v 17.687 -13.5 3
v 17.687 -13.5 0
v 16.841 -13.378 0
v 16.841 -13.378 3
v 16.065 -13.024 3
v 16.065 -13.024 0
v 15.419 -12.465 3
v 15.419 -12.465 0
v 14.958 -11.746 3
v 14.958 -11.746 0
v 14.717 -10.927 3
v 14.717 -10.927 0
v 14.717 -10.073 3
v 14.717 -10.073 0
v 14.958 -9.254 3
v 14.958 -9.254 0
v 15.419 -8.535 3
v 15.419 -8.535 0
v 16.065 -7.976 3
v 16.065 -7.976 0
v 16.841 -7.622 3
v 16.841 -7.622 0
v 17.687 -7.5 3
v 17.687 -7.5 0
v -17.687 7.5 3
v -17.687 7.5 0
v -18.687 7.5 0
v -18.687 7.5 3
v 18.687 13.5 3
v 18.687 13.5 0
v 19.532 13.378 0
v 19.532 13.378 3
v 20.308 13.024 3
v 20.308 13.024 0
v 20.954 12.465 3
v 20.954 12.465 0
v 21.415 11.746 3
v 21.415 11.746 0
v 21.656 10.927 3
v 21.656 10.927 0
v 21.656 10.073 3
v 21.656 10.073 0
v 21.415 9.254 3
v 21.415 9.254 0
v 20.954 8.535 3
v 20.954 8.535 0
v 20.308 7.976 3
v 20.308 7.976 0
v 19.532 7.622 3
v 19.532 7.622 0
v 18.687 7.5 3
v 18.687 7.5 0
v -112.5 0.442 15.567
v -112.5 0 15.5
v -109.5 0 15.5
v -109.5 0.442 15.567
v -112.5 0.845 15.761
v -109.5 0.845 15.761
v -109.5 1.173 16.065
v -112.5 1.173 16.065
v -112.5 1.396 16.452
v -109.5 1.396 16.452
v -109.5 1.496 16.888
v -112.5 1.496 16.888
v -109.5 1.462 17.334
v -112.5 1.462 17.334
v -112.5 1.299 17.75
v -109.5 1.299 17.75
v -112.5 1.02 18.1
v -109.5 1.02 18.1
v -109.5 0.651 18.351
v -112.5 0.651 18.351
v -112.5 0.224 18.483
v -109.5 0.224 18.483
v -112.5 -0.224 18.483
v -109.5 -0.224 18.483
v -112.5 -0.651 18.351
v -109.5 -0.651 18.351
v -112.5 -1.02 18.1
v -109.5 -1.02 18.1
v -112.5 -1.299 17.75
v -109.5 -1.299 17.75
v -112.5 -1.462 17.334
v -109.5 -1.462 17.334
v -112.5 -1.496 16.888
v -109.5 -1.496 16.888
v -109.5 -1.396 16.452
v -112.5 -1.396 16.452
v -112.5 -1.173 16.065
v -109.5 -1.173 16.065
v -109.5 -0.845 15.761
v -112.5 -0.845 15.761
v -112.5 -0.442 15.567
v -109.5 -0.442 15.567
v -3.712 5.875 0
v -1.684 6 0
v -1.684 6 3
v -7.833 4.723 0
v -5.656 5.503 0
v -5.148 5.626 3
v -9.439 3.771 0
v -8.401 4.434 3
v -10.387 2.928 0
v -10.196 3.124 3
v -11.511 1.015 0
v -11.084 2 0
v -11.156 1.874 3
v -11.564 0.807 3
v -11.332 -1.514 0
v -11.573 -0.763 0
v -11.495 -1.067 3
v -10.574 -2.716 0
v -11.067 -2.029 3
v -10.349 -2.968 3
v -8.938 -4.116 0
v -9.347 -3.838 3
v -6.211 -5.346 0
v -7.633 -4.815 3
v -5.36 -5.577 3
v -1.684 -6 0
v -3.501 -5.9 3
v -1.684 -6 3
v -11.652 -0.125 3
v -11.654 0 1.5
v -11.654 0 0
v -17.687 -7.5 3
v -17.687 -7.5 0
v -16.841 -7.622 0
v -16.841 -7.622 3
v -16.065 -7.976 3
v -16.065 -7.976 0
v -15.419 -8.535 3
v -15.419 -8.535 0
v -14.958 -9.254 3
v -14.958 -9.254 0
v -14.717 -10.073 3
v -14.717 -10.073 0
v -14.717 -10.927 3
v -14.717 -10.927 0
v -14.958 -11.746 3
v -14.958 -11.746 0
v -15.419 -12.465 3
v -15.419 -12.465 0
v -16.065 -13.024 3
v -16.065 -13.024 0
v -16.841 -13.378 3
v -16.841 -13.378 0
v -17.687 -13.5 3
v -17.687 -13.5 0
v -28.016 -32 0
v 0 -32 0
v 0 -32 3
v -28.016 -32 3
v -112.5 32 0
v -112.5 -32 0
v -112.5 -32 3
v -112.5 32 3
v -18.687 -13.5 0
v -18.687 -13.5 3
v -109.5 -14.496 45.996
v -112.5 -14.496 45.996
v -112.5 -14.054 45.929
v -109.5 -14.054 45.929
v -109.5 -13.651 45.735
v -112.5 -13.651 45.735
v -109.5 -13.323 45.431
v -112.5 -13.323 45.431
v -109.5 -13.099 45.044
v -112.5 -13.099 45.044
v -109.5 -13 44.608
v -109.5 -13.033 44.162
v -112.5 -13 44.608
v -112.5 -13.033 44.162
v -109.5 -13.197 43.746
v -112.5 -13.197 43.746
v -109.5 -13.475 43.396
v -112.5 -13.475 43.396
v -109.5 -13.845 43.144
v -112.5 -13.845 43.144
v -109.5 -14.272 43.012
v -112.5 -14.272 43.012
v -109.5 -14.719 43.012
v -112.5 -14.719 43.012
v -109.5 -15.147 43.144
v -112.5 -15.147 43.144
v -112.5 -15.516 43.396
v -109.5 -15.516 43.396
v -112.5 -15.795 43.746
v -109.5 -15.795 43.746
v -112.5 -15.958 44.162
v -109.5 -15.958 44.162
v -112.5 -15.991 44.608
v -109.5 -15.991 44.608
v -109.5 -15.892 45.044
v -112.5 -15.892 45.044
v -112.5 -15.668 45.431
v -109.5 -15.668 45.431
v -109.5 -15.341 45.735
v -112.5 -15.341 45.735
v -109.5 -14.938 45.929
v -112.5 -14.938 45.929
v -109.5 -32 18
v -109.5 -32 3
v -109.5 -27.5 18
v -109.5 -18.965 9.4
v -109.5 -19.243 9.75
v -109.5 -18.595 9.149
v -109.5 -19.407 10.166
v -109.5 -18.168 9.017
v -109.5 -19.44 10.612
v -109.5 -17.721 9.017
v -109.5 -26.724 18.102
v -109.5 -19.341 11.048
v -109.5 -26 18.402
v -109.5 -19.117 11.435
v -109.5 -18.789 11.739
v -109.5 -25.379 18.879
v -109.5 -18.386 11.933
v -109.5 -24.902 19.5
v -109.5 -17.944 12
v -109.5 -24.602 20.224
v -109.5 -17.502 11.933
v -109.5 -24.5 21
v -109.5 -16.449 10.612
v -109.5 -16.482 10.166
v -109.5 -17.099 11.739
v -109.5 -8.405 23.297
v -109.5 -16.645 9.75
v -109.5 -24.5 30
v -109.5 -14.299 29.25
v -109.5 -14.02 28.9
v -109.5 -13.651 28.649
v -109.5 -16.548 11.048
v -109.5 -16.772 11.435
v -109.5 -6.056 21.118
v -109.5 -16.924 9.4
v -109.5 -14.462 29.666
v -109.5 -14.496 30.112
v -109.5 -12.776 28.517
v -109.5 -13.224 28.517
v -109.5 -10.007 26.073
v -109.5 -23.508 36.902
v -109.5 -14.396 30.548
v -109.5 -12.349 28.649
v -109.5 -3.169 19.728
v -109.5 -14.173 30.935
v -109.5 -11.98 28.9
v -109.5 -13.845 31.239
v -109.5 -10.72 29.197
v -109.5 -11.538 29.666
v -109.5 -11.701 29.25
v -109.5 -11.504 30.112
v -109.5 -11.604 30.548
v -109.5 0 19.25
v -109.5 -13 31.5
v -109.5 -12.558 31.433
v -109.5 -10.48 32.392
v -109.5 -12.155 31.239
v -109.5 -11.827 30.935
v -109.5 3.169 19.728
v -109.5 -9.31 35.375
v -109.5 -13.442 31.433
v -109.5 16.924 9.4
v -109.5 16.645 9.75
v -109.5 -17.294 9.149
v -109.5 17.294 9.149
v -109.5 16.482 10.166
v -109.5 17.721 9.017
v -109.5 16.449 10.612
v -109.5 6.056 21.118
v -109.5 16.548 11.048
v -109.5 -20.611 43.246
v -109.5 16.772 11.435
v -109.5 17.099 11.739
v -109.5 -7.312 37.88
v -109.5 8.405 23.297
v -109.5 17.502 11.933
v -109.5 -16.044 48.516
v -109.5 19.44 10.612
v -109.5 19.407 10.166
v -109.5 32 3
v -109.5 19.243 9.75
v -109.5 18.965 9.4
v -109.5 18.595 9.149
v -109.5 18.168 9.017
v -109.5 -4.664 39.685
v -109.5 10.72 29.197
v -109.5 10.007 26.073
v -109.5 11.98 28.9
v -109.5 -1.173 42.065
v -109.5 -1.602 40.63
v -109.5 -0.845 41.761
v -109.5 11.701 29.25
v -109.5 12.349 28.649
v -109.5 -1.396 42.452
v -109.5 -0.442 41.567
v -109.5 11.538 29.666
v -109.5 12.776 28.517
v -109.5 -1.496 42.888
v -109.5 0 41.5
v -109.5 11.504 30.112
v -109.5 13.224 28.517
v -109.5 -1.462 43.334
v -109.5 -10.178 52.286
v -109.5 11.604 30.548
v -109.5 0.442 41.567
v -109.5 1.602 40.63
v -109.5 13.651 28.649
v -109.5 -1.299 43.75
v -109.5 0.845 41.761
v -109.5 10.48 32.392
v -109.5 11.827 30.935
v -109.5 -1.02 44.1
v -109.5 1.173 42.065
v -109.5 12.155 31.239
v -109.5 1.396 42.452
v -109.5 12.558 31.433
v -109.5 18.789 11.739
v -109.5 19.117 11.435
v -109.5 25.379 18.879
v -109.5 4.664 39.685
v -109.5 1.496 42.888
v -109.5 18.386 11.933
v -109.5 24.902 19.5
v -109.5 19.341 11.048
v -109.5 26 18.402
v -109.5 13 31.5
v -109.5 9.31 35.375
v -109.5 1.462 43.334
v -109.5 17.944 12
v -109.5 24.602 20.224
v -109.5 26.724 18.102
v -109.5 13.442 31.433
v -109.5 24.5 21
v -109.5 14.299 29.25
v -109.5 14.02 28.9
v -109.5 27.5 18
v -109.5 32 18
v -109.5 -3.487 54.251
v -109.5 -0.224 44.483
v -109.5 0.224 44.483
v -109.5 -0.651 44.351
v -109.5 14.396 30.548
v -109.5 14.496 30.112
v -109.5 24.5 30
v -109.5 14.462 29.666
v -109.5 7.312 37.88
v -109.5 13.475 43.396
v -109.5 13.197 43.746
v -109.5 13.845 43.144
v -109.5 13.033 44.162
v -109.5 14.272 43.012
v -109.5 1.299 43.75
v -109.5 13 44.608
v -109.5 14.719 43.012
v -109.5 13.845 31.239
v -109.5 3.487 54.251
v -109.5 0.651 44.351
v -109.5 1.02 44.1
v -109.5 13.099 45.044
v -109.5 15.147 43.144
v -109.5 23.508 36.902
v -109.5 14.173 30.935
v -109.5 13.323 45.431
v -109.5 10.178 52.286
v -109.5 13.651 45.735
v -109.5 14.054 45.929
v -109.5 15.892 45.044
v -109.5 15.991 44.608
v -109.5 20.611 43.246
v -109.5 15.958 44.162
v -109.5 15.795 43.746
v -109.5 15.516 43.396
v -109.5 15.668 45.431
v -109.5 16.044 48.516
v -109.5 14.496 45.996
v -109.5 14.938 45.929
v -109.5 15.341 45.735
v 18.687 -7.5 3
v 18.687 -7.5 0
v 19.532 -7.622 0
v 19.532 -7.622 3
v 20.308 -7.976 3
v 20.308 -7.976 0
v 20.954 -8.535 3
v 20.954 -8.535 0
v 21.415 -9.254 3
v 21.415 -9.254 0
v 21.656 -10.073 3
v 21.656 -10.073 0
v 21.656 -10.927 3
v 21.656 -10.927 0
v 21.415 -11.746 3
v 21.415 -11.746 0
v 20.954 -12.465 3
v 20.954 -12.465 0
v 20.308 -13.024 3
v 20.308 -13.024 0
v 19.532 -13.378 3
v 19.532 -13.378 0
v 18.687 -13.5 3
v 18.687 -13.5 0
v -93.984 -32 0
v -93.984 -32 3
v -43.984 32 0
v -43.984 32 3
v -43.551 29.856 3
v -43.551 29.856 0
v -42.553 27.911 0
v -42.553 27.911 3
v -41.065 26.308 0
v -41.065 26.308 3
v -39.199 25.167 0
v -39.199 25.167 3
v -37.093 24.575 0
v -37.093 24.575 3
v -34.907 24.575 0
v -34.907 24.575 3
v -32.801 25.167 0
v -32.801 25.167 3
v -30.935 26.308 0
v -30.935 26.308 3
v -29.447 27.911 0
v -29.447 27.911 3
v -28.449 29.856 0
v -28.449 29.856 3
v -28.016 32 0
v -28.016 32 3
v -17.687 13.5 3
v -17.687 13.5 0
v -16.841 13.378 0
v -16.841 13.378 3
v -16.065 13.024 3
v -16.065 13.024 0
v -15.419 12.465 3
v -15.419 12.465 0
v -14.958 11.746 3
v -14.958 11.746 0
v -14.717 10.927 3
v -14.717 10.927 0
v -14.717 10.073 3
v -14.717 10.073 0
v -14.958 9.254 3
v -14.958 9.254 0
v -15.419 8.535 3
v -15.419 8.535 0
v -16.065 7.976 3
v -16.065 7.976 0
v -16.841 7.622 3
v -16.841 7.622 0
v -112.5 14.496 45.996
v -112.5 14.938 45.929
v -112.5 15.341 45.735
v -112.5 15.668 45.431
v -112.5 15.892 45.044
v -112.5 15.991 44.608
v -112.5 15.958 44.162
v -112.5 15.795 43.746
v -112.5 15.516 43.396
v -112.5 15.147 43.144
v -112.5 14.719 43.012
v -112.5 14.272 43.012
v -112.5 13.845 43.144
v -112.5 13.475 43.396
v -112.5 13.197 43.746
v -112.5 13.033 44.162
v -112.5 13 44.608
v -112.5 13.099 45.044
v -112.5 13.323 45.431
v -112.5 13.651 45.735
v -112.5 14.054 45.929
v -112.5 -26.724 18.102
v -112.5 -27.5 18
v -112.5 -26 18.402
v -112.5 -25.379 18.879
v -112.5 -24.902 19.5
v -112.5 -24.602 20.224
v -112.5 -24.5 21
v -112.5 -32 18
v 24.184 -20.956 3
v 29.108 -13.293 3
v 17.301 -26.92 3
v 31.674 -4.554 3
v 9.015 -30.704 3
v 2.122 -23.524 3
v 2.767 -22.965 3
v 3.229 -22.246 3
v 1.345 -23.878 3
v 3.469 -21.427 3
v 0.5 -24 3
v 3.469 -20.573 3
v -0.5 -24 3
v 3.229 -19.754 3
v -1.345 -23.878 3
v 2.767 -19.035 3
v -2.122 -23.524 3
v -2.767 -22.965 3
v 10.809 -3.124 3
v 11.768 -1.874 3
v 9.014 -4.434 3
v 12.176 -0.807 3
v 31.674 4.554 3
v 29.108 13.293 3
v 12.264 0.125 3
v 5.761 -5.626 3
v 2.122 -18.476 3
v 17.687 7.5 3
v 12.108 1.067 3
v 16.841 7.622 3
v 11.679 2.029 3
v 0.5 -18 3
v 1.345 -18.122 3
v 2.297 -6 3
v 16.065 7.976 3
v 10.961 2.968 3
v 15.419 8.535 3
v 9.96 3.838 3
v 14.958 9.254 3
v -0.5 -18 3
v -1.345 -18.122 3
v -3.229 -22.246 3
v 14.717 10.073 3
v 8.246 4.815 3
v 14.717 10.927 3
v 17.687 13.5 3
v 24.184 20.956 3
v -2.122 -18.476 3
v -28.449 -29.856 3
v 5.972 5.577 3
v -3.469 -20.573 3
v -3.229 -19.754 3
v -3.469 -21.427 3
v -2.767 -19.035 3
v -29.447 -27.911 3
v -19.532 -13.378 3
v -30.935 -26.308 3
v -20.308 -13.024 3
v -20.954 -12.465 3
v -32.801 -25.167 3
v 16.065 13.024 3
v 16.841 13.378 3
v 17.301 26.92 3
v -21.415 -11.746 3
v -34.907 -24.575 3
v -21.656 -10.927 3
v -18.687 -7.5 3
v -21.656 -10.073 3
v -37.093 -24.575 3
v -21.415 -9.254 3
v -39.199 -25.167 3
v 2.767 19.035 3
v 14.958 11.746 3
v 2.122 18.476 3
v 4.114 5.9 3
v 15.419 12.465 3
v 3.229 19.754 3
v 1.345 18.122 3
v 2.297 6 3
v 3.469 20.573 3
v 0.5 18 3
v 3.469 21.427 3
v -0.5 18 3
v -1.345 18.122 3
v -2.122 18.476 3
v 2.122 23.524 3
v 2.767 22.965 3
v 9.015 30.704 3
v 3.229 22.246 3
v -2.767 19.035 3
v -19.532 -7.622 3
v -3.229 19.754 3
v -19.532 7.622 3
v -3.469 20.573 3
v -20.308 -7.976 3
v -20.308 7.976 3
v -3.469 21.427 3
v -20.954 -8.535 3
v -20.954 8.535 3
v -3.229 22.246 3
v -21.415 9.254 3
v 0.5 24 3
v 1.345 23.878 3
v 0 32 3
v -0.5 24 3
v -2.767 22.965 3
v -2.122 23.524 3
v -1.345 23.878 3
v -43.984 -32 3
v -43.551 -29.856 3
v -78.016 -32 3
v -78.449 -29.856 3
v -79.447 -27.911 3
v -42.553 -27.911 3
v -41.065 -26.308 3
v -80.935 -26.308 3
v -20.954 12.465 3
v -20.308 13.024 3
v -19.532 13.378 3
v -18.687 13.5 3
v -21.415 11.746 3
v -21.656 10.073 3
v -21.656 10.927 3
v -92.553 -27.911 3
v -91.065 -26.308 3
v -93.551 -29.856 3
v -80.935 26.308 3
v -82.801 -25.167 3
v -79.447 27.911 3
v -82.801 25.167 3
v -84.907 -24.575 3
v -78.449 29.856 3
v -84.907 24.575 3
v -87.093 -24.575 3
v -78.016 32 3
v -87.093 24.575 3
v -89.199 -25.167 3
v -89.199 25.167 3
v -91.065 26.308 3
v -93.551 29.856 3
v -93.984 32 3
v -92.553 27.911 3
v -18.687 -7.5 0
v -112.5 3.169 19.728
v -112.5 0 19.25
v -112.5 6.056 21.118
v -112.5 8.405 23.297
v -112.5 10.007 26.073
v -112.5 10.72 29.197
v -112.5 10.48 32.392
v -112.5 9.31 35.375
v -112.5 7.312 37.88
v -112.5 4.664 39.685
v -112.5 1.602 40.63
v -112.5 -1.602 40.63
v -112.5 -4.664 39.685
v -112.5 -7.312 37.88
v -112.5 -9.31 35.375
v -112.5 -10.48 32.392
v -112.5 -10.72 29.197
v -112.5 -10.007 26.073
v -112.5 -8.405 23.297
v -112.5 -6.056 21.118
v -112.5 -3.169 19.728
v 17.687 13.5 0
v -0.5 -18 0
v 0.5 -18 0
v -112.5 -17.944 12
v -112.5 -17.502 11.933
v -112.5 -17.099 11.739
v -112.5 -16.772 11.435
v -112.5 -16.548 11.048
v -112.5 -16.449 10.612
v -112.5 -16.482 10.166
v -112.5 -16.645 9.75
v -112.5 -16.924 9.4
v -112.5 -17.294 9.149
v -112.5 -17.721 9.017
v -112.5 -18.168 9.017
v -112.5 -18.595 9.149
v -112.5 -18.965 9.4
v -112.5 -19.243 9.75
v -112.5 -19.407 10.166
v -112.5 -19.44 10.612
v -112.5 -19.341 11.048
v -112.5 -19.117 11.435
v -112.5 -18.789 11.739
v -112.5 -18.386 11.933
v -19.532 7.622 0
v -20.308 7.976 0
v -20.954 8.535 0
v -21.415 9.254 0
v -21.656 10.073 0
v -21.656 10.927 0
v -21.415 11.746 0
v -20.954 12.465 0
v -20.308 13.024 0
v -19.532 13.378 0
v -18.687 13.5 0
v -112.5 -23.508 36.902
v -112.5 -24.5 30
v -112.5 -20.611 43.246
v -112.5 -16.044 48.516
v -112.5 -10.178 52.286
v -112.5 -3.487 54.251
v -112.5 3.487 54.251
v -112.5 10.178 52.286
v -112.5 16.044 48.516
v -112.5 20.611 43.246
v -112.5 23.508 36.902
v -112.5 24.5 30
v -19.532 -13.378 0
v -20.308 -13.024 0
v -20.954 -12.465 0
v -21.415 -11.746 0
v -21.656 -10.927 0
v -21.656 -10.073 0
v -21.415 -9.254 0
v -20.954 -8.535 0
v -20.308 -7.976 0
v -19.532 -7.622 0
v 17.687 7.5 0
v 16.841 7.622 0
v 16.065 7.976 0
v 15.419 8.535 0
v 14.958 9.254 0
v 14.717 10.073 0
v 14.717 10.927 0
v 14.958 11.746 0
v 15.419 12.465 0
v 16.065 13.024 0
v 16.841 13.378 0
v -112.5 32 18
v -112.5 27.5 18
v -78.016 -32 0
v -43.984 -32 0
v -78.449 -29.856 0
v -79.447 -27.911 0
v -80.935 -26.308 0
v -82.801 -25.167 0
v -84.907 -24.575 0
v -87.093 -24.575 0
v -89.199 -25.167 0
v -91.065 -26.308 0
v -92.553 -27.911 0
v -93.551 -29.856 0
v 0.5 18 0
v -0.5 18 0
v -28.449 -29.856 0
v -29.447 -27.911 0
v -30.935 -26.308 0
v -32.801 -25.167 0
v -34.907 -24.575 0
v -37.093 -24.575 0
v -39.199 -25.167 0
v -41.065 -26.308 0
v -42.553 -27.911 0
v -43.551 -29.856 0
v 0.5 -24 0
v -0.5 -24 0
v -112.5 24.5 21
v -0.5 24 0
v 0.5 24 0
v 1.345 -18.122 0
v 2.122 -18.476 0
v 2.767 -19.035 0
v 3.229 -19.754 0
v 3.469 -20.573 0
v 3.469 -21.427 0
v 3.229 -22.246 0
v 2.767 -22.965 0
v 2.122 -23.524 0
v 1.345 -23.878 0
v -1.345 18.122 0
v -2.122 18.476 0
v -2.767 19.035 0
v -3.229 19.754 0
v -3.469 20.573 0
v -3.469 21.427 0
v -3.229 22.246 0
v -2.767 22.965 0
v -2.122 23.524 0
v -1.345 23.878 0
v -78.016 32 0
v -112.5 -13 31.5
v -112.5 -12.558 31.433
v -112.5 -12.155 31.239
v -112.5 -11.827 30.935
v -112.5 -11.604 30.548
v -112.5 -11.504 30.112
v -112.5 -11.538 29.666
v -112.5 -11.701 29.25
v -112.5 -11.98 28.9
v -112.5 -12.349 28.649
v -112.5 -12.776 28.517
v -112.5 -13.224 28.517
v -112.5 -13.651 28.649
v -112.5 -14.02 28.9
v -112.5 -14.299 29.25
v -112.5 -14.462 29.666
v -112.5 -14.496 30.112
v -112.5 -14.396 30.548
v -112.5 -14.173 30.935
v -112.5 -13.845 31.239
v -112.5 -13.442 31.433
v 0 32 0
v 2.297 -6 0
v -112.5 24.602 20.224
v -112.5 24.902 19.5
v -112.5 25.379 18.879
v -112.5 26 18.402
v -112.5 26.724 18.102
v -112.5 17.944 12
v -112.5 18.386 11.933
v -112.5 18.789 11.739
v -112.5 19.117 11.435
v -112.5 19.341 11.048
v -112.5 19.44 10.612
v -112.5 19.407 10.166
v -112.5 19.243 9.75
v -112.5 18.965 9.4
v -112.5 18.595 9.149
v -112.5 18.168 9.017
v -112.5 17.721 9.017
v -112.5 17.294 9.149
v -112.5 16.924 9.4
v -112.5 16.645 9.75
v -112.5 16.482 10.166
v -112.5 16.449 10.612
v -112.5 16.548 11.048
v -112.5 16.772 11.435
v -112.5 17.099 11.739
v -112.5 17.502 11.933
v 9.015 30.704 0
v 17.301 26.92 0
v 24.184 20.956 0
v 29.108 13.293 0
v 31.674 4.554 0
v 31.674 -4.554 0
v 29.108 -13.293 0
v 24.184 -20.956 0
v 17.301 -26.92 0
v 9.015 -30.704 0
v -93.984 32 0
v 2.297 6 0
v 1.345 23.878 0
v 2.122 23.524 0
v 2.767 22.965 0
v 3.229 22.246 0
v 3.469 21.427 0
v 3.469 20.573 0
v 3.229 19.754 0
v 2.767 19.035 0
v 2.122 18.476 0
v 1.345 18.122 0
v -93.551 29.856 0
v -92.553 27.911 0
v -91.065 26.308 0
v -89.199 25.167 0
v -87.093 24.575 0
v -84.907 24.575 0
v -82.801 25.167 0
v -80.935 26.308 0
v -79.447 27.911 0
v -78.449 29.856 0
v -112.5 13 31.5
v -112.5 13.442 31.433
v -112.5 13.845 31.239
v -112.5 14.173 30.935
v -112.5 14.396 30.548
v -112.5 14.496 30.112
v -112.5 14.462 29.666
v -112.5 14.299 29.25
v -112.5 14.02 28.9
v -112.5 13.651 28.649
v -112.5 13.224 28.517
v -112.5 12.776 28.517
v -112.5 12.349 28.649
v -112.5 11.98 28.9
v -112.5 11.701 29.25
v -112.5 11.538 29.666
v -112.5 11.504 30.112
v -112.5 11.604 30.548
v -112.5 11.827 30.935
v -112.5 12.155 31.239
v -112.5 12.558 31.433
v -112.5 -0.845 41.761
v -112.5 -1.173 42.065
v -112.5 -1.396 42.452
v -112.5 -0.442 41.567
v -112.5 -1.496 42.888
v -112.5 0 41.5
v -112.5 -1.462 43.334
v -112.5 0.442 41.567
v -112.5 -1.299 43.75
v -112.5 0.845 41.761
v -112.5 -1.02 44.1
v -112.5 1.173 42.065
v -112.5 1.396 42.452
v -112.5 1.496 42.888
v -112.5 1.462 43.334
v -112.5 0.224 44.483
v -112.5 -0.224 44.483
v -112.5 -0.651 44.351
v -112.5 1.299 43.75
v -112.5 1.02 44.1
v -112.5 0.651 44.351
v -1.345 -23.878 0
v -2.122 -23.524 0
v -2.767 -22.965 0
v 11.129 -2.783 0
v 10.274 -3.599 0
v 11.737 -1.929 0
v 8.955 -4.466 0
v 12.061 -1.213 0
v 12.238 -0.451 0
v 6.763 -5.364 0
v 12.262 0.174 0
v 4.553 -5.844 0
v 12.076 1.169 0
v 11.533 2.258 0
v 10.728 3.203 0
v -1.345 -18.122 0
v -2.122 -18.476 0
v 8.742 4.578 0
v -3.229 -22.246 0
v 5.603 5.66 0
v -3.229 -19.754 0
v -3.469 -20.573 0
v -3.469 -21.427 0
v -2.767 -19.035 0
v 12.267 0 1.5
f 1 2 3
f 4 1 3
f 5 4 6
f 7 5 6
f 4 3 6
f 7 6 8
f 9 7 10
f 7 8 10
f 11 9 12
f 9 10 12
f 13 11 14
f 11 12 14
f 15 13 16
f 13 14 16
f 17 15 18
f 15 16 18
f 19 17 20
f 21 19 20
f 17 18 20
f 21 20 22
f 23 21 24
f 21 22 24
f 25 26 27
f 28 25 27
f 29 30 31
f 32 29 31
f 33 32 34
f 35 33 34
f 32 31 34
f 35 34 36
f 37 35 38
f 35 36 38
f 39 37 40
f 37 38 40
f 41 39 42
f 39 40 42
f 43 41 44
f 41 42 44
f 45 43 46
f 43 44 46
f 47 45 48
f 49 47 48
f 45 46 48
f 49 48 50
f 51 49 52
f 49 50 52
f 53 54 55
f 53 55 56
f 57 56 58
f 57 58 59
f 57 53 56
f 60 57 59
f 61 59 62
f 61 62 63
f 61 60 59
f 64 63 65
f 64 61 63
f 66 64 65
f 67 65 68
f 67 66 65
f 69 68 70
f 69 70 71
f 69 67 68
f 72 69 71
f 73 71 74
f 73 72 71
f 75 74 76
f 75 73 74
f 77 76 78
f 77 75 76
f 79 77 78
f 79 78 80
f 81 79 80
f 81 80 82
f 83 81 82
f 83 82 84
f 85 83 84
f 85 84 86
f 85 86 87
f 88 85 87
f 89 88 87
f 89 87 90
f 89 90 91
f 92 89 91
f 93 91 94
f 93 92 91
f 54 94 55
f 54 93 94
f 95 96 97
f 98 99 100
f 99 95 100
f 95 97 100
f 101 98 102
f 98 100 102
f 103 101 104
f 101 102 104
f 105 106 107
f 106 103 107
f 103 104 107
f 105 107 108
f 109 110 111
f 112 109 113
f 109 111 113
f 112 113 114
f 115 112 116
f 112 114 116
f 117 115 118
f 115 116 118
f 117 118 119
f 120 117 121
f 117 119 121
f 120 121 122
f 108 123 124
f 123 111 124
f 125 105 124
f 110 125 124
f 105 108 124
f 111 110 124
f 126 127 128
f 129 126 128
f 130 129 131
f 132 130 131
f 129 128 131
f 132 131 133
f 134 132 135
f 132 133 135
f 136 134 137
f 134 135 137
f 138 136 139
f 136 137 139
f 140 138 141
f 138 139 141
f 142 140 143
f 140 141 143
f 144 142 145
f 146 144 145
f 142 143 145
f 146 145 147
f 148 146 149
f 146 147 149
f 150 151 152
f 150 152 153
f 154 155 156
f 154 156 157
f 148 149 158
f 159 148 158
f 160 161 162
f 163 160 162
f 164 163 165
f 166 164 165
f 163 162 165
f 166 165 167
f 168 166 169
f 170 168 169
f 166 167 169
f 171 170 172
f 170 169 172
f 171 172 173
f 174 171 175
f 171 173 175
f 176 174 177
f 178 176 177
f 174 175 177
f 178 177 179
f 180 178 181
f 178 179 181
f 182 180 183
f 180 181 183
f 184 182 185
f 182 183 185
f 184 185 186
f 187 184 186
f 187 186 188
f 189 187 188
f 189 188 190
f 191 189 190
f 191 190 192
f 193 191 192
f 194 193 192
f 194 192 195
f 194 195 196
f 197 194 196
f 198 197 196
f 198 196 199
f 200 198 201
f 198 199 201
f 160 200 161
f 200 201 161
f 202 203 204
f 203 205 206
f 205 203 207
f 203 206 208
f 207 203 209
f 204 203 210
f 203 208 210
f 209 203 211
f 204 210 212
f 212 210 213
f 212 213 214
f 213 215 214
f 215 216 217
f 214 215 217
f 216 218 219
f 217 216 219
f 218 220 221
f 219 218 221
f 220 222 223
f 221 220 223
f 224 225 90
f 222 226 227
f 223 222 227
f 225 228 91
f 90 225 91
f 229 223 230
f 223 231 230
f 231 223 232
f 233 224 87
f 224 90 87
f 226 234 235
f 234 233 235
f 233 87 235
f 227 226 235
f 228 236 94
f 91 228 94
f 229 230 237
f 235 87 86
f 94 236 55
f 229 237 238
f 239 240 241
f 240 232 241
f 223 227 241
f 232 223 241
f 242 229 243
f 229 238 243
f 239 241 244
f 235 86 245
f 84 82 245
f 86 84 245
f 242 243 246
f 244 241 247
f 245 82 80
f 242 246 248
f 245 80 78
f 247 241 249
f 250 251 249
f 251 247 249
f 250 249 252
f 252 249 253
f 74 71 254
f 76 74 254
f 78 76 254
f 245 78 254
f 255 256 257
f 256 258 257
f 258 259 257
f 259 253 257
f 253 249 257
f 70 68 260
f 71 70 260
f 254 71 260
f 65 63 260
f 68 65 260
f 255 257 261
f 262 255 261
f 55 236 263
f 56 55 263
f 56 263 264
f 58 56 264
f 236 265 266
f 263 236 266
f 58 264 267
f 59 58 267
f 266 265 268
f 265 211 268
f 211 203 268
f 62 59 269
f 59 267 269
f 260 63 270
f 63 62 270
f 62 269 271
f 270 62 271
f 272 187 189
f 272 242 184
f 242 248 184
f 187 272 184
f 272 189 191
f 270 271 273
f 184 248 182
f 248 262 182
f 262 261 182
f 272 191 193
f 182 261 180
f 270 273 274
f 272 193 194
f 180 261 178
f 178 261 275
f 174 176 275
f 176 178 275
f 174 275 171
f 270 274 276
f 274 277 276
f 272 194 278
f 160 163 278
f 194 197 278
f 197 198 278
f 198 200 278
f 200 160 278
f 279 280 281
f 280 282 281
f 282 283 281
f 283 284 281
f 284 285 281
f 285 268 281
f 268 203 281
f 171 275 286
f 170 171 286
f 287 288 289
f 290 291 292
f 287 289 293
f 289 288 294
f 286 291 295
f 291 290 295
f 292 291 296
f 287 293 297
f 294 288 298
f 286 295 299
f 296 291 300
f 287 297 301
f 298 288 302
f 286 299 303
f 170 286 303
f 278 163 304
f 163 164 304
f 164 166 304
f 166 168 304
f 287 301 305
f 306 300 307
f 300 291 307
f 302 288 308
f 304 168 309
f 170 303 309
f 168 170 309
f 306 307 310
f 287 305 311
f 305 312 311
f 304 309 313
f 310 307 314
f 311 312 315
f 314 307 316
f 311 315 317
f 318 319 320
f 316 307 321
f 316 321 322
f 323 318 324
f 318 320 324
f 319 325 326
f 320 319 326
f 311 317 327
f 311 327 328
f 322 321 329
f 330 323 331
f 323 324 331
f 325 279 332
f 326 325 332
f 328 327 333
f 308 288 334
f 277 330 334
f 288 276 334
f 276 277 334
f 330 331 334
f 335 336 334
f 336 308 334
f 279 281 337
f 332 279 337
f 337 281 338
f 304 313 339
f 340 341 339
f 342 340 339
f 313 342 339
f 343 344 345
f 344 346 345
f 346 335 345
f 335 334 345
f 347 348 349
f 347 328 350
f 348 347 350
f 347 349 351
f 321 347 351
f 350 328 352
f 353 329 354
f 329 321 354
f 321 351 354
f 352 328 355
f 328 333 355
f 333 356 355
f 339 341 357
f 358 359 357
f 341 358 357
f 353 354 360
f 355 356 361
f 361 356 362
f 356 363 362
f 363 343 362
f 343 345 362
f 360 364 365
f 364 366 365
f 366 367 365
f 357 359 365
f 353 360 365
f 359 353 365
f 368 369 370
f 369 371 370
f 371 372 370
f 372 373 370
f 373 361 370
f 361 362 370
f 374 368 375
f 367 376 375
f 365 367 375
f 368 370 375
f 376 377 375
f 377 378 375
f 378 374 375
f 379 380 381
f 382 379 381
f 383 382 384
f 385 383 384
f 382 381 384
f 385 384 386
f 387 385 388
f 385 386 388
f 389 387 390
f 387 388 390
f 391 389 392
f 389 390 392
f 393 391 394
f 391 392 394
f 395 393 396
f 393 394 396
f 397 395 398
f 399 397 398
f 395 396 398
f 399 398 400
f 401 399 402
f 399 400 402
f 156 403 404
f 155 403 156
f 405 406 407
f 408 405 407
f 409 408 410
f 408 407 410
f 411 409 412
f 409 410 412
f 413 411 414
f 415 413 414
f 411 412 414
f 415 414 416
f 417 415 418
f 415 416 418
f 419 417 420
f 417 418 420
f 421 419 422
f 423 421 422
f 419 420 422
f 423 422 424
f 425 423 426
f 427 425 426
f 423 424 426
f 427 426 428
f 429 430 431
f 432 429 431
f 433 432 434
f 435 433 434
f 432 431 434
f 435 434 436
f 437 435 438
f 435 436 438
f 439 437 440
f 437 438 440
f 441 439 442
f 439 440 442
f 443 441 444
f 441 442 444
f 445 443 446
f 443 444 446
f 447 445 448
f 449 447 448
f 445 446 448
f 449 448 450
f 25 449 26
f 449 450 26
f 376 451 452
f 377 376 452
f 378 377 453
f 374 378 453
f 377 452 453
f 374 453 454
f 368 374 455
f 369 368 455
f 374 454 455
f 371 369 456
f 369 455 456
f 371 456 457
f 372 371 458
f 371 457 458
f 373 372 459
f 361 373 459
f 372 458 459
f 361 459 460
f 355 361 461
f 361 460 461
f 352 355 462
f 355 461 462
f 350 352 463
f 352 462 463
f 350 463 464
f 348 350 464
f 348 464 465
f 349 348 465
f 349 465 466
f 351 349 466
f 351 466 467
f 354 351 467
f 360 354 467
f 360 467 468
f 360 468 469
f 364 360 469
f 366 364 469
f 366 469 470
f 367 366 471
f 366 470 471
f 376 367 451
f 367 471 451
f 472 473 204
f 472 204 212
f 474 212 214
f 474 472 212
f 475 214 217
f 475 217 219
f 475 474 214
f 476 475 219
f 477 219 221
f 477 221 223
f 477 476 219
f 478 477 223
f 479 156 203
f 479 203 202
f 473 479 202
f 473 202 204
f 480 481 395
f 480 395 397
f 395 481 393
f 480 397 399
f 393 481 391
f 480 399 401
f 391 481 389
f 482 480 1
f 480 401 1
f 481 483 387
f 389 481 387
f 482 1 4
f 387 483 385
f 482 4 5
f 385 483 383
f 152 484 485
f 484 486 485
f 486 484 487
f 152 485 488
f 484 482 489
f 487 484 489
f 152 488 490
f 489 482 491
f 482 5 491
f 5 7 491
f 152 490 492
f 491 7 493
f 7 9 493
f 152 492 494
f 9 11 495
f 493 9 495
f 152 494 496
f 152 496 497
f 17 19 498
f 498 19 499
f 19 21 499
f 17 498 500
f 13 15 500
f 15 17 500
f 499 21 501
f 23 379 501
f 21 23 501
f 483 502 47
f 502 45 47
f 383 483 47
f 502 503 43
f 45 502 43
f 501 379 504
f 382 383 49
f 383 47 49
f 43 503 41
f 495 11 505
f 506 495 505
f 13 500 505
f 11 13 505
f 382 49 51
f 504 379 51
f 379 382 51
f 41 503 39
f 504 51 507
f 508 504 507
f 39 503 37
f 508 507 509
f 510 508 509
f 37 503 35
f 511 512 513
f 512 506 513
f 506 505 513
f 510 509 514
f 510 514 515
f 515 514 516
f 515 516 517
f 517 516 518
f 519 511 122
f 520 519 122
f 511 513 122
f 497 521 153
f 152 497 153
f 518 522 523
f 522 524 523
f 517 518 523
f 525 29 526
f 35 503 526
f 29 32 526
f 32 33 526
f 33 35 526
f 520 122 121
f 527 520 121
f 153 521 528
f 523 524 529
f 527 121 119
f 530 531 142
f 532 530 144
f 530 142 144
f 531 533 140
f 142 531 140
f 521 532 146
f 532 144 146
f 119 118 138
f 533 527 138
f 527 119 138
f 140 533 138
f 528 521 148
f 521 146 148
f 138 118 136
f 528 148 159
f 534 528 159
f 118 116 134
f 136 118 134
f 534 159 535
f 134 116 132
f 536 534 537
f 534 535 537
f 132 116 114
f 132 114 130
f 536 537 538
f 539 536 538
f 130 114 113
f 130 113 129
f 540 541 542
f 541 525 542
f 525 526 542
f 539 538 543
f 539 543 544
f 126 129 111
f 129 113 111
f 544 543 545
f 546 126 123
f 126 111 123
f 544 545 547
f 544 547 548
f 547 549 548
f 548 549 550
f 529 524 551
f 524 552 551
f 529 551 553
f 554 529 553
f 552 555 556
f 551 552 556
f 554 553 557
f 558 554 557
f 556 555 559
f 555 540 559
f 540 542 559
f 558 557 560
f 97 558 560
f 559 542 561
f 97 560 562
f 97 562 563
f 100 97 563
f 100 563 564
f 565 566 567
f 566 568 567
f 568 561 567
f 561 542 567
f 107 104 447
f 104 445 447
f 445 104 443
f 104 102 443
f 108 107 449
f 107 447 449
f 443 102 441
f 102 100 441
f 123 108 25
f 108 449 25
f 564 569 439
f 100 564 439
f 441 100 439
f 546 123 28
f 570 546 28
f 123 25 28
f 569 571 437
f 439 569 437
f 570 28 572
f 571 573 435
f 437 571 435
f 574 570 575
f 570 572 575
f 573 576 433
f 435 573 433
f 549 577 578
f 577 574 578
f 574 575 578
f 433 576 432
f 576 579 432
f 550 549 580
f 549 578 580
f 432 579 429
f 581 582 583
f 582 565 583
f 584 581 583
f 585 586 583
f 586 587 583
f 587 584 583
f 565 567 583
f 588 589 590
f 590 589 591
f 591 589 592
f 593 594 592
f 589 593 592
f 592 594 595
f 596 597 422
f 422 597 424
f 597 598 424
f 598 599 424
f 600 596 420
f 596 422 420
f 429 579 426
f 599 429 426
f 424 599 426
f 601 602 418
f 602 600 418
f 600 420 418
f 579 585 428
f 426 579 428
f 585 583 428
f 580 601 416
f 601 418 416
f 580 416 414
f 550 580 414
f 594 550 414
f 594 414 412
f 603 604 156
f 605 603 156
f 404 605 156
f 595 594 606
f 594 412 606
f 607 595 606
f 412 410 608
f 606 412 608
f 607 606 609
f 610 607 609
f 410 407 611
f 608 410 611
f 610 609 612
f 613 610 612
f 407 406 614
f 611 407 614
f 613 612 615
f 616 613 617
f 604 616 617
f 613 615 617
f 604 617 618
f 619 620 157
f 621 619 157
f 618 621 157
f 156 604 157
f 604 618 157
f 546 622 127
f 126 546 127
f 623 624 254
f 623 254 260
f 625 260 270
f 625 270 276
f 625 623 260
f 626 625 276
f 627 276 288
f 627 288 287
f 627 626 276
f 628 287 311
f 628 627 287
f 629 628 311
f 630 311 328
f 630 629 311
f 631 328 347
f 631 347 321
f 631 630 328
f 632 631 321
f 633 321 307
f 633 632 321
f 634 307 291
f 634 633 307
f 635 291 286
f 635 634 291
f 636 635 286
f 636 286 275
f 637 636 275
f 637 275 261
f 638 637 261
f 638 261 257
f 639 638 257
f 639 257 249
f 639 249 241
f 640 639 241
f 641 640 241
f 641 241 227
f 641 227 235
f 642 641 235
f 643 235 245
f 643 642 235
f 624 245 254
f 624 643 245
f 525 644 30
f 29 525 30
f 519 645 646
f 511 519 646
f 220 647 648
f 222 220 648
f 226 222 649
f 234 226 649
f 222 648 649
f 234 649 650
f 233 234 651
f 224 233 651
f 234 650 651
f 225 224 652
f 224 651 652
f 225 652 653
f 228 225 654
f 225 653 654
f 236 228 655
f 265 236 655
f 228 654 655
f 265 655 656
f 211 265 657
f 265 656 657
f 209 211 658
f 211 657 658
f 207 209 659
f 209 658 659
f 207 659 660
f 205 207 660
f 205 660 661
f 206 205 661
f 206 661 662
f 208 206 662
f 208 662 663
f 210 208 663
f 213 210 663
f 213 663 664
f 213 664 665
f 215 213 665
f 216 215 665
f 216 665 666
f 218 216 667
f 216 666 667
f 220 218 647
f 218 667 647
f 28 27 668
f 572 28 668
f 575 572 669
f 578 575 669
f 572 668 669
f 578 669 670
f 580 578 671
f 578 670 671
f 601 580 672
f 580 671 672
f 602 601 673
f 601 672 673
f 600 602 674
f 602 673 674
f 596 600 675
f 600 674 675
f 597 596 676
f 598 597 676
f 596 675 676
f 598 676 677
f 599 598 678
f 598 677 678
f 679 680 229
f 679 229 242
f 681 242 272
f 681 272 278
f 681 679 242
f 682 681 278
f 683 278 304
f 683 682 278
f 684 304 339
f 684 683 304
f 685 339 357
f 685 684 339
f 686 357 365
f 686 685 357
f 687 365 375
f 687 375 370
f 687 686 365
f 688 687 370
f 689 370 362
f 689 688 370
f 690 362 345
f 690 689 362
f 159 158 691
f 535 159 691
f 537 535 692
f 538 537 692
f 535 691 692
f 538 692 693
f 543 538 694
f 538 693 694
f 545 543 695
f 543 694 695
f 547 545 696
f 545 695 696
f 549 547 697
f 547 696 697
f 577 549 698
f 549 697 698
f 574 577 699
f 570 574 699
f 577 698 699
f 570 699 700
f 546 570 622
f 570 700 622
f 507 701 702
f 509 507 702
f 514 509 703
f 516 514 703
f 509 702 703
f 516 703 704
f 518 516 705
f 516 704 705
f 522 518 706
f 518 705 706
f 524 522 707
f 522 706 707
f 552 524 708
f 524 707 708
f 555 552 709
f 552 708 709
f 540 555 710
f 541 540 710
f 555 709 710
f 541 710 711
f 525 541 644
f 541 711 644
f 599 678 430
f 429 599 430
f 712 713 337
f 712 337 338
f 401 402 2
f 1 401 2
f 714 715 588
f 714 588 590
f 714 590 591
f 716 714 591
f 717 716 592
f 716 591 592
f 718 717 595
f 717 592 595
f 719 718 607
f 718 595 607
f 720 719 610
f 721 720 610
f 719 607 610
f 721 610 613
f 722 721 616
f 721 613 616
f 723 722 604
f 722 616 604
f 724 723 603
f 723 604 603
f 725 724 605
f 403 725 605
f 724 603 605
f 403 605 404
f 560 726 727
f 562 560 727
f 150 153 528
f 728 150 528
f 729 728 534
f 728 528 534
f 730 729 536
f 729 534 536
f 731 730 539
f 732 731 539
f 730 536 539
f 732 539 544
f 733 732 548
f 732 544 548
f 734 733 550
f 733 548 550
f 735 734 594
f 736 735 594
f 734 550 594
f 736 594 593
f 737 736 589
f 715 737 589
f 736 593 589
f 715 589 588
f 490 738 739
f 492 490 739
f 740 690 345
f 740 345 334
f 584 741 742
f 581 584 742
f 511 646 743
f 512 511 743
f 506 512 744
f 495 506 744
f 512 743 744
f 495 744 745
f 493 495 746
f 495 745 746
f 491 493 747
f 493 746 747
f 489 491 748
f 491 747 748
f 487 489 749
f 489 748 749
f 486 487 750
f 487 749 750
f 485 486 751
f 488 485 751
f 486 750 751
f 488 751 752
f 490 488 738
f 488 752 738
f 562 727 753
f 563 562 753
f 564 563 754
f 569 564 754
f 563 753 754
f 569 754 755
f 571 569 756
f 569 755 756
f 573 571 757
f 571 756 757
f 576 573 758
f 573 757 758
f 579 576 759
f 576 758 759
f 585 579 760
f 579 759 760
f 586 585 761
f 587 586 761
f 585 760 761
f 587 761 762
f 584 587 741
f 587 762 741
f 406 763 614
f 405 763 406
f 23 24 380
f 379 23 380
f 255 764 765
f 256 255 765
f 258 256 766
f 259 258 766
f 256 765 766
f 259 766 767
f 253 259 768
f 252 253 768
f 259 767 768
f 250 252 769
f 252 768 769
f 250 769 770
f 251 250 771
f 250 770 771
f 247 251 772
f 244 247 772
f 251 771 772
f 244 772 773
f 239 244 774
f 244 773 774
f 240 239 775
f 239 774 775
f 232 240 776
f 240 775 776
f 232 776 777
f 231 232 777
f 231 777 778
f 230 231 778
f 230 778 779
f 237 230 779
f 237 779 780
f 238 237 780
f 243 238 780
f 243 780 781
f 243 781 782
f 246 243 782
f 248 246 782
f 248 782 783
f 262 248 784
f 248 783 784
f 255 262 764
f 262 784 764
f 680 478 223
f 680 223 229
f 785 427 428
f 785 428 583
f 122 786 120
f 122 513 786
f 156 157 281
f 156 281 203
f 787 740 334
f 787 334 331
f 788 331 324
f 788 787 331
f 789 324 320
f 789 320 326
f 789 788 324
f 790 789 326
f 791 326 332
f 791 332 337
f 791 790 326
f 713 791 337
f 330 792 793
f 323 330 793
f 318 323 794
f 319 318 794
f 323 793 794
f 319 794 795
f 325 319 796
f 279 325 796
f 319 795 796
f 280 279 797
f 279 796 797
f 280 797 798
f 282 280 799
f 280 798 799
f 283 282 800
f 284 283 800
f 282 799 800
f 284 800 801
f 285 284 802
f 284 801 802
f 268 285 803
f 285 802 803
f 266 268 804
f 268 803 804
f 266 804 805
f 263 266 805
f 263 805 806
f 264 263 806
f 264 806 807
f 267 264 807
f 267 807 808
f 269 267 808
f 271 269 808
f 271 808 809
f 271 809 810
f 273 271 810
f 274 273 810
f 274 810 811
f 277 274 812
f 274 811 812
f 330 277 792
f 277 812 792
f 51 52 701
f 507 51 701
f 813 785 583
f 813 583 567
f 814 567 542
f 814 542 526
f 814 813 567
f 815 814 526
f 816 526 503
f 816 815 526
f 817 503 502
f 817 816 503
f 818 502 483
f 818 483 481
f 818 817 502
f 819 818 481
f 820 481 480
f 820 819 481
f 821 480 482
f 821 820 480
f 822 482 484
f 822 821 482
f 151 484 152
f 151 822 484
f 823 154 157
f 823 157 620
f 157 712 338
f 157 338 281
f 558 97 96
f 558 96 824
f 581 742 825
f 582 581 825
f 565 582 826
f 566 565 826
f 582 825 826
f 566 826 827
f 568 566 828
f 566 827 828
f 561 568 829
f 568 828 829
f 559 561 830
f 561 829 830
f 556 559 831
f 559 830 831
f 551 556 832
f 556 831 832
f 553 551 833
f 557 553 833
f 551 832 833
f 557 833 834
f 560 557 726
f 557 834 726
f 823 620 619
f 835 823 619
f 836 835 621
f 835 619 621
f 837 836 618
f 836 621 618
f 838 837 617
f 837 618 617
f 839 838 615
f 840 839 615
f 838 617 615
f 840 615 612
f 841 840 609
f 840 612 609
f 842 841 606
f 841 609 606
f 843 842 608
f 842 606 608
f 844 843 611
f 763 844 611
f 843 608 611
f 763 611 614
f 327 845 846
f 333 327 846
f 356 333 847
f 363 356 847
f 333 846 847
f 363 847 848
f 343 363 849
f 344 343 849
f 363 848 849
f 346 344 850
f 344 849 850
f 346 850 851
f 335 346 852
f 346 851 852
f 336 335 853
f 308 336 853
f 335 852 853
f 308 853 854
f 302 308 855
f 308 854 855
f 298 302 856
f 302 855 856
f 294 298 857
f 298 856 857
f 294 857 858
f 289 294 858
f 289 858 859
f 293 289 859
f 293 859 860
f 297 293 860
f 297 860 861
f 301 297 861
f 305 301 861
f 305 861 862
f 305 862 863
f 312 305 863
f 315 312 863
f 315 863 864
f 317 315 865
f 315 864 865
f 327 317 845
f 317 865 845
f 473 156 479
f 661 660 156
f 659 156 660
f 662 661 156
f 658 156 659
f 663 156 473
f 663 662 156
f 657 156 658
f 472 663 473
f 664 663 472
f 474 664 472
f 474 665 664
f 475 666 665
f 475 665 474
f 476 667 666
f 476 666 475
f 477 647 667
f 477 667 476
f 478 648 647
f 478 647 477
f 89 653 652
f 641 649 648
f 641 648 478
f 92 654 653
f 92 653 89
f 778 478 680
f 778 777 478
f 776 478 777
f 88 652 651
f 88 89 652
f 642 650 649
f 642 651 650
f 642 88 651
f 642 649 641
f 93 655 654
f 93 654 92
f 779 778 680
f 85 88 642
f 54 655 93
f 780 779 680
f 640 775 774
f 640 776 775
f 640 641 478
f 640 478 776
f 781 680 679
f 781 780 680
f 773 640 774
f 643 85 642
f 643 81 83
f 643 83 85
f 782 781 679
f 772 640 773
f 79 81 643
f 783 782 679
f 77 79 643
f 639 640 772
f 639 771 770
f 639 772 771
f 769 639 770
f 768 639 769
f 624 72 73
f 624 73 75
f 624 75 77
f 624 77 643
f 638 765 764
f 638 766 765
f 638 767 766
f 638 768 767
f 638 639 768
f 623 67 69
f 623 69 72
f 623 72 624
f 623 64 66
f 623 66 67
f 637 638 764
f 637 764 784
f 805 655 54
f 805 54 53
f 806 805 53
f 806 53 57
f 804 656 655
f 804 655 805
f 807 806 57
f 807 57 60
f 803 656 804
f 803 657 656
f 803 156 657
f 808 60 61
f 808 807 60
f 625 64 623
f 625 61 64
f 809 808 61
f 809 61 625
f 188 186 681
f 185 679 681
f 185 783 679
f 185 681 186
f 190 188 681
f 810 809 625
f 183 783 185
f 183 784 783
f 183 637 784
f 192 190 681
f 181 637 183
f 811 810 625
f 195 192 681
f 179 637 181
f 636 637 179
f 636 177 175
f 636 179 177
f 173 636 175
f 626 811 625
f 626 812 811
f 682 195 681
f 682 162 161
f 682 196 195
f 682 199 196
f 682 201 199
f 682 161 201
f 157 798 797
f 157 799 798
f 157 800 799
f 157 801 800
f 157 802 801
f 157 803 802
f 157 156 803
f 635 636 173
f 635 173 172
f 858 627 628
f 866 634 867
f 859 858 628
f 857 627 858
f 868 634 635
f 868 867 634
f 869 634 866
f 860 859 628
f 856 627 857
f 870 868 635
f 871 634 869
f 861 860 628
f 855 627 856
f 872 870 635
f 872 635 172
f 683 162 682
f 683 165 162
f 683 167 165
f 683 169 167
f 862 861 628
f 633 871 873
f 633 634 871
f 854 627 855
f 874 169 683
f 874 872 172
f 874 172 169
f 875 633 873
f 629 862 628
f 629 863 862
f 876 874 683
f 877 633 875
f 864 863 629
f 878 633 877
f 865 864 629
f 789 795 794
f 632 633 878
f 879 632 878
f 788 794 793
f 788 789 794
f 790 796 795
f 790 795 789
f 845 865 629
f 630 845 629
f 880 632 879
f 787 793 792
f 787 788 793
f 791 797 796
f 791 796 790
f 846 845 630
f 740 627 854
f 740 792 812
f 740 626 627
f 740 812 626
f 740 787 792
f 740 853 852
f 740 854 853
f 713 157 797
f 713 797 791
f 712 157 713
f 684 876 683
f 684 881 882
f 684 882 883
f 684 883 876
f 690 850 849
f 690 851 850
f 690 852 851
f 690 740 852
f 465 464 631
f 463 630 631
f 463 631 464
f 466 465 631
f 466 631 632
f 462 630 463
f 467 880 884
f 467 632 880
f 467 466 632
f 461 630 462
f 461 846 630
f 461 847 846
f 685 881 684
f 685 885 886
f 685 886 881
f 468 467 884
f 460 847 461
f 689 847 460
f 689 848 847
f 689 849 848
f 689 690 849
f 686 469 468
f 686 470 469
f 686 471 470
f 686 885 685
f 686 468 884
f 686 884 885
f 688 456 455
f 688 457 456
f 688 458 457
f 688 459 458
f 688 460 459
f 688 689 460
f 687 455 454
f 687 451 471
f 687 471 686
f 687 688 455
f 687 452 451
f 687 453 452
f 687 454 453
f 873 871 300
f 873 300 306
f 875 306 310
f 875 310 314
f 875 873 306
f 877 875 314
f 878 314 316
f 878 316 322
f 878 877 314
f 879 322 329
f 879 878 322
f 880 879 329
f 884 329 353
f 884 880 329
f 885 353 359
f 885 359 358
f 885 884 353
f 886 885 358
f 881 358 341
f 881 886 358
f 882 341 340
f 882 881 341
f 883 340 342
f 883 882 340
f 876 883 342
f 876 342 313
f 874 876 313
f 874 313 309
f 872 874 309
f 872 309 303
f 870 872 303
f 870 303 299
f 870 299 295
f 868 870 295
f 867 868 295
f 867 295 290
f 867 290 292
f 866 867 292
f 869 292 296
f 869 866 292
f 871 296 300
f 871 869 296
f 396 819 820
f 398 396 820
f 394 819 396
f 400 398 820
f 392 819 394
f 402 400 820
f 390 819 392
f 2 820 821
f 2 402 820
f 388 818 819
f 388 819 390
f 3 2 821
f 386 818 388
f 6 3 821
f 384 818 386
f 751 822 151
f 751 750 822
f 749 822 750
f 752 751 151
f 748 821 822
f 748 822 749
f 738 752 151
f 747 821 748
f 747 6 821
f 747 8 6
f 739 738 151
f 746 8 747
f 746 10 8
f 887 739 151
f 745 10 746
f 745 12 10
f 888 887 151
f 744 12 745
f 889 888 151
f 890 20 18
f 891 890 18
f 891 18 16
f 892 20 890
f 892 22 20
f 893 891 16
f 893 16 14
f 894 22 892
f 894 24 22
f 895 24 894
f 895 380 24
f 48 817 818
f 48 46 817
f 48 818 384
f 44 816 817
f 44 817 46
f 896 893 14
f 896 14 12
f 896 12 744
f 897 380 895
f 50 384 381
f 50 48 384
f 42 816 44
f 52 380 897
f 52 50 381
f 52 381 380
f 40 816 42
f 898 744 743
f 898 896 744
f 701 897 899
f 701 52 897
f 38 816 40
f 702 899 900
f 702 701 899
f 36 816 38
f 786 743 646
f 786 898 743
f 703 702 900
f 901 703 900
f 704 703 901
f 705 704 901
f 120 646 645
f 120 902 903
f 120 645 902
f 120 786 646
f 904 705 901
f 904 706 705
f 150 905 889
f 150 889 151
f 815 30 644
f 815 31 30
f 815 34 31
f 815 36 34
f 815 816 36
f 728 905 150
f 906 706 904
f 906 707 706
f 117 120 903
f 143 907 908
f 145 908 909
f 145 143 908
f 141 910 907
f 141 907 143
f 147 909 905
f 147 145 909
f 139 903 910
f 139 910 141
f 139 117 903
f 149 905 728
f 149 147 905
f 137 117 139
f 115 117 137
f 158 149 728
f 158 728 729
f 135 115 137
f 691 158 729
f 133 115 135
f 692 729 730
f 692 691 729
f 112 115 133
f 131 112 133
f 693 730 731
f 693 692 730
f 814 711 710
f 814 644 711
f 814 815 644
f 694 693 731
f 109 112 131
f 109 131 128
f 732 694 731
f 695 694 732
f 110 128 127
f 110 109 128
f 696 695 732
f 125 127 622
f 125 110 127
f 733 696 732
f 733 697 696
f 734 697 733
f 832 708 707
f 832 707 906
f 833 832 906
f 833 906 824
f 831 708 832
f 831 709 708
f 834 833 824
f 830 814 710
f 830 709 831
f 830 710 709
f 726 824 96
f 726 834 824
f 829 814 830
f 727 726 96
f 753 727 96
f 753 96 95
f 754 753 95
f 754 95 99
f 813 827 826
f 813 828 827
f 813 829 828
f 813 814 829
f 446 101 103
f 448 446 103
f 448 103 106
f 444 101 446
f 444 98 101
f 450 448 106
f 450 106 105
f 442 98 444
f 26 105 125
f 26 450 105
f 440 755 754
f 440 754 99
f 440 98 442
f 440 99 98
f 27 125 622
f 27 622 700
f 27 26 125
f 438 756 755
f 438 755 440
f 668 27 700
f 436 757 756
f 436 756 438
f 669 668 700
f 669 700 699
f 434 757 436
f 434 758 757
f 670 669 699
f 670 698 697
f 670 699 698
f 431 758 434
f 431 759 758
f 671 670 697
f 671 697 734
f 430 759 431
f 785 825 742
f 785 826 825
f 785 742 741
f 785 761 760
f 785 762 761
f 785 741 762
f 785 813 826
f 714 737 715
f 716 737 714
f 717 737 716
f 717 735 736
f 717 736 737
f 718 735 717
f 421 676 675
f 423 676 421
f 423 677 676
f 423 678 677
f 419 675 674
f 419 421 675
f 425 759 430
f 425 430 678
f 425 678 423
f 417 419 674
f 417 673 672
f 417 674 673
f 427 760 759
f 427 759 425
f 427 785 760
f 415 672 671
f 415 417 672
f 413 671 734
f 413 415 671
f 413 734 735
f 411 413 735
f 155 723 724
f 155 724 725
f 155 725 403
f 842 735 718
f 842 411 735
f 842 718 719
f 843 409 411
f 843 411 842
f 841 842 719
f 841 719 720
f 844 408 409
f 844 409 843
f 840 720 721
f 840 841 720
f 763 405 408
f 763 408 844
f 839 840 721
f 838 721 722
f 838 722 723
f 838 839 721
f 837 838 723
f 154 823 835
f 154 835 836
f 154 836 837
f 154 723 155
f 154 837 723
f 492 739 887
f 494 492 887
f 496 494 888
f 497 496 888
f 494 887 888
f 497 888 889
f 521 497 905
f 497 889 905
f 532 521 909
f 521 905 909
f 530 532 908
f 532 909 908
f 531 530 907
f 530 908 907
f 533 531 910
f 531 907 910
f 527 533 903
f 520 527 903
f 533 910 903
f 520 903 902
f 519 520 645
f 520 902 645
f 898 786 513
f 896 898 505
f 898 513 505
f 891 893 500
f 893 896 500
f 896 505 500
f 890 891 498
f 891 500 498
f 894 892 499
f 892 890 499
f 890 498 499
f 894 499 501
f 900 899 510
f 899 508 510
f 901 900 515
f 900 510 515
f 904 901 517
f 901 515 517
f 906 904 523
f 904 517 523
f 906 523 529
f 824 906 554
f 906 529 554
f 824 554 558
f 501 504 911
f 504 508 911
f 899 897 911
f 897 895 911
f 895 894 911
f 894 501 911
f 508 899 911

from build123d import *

# Parameters (mm, degrees)
BOSS_EXTRUDE1_DEPTH = 3
SKETCH2_R           = 1.5
BOSS_EXTRUDE2_DEPTH = 3
SKETCH3_R           = 6
CUT_EXTRUDE1_DEPTH  = 150.495916109
CUT_EXTRUDE2_DEPTH  = 128.79866979
CUT_EXTRUDE4_DEPTH  = 3


with BuildPart() as part:
    # Sketch1 → Boss-Extrude1 (new body)
    with BuildSketch(Plane.XY):
        with BuildLine():
            Line((-112.5, 32), (0, 32))
            ThreePointArc((0, 32), (32, 0), (0, -32))
            Line((0, -32), (-112.5, -32))
            Line((-112.5, -32), (-112.5, 32))
        make_face()
        with BuildLine():
            Line((17.686533479, 13.5), (18.686533479, 13.5))
            ThreePointArc((18.686533479, 13.5), (21.686533479, 10.5), (18.686533479, 7.5))
            Line((18.686533479, 7.5), (17.686533479, 7.5))
            ThreePointArc((17.686533479, 7.5), (14.686533479, 10.5), (17.686533479, 13.5))
        make_face(mode=Mode.SUBTRACT)
        with BuildLine():
            Line((17.686533479, -7.5), (18.686533479, -7.5))
            ThreePointArc((18.686533479, -7.5), (21.686533479, -10.5), (18.686533479, -13.5))
            Line((18.686533479, -13.5), (17.686533479, -13.5))
            ThreePointArc((17.686533479, -13.5), (14.686533479, -10.5), (17.686533479, -7.5))
        make_face(mode=Mode.SUBTRACT)
        with BuildLine():
            Line((-0.5, -18), (0.5, -18))
            ThreePointArc((0.5, -18), (3.5, -21), (0.5, -24))
            Line((0.5, -24), (-0.5, -24))
            ThreePointArc((-0.5, -24), (-3.5, -21), (-0.5, -18))
        make_face(mode=Mode.SUBTRACT)
        with BuildLine():
            Line((-18.686533479, -7.5), (-17.686533479, -7.5))
            ThreePointArc((-17.686533479, -7.5), (-14.686533479, -10.5), (-17.686533479, -13.5))
            Line((-17.686533479, -13.5), (-18.686533479, -13.5))
            ThreePointArc((-18.686533479, -13.5), (-21.686533479, -10.5), (-18.686533479, -7.5))
        make_face(mode=Mode.SUBTRACT)
        with BuildLine():
            Line((-17.686533479, 7.5), (-18.686533479, 7.5))
            ThreePointArc((-18.686533479, 7.5), (-21.686533479, 10.5), (-18.686533479, 13.5))
            Line((-18.686533479, 13.5), (-17.686533479, 13.5))
            ThreePointArc((-17.686533479, 13.5), (-14.686533479, 10.5), (-17.686533479, 7.5))
        make_face(mode=Mode.SUBTRACT)
        with BuildLine():
            Line((0.5, 18), (-0.5, 18))
            ThreePointArc((-0.5, 18), (-3.5, 21), (-0.5, 24))
            Line((-0.5, 24), (0.5, 24))
            ThreePointArc((0.5, 24), (3.5, 21), (0.5, 18))
        make_face(mode=Mode.SUBTRACT)
    extrude(amount=BOSS_EXTRUDE1_DEPTH)

    # Sketch3 → Cut-Extrude1 (cut, through all)
    with BuildSketch(Plane(origin=(-68.399252687, 0, -51.542533886), x_dir=(0, 1, 0), z_dir=(0.798635510047294, 0, 0.6018150231520466))):
        with Locations(Location((0, 1.0136449, 0), (0, 0, 90))):
            Circle(SKETCH3_R)
    extrude(amount=CUT_EXTRUDE1_DEPTH, mode=Mode.SUBTRACT)

    # Sketch4 → Cut-Extrude2 (cut, through all)
    with BuildSketch(Plane.XY.offset(3)):
        with BuildLine():
            Line((2.296821411, -6), (-1.684313054, -6))
            add(Edge.make_bspline(
                [(-1.684313054, 6), (-11.654153901, 6), (-11.654153901, 0), (-11.654153901, -6), (-1.684313054, -6)],
                knots=[4.71238898, 4.71238898, 4.71238898, 6.283185307, 6.283185307, 7.853981634, 7.853981634, 7.853981634], degree=2, weights=[1, 0.707106781, 1, 0.707106781, 1]))
            Line((-1.684313054, 6), (2.296821411, 6))
            add(Edge.make_bspline(
                [(2.296821411, -6), (12.266662258, -6), (12.266662258, 0), (12.266662258, 6), (2.296821411, 6)],
                knots=[4.71238898, 4.71238898, 4.71238898, 6.283185307, 6.283185307, 7.853981634, 7.853981634, 7.853981634], degree=2, weights=[1, 0.707106781, 1, 0.707106781, 1]))
        make_face()
    extrude(amount=-CUT_EXTRUDE2_DEPTH, mode=Mode.SUBTRACT)

    # Sketch5 → Cut-Extrude4 (cut)
    with BuildSketch(Plane.XY.offset(3)):
        with BuildLine():
            ThreePointArc((-86, 40.5), (-80.522774425, 38.330951895), (-78.015640289, 33))
            Line((-78.015640289, 33), (-43.984359711, 33))
            ThreePointArc((-43.984359711, 33), (-41.477225575, 38.330951895), (-36, 40.5))
            Line((-36, 40.5), (-86, 40.5))
        make_face()
        with BuildLine():
            ThreePointArc((-78, 32.5), (-78.003911028, 32.750122279), (-78.015640289, 33))
            ThreePointArc((-78.015640289, 33), (-80.522774425, 38.330951895), (-86, 40.5))
            ThreePointArc((-86, 40.5), (-91.830951895, 37.977225575), (-93.984359711, 32))
            Line((-93.984359711, 32), (-78.015640289, 32))
            ThreePointArc((-78.015640289, 32), (-78.003911028, 32.249877721), (-78, 32.5))
        make_face()
        with BuildLine():
            ThreePointArc((-93.984359711, 32), (-86, 24.5), (-78.015640289, 32))
            Line((-78.015640289, 32), (-93.984359711, 32))
        make_face()
        with BuildLine():
            ThreePointArc((-36, 40.5), (-41.477225575, 38.330951895), (-43.984359711, 33))
            ThreePointArc((-43.984359711, 33), (-44, 32.5), (-43.984359711, 32))
            Line((-43.984359711, 32), (-28.015640289, 32))
            ThreePointArc((-28.015640289, 32), (-28.003911028, 32.249877721), (-28, 32.5))
            ThreePointArc((-28, 32.5), (-30.343145751, 38.156854249), (-36, 40.5))
        make_face()
        with BuildLine():
            Line((-28.015640289, 32), (-43.984359711, 32))
            ThreePointArc((-43.984359711, 32), (-36, 24.5), (-28.015640289, 32))
        make_face()
        with BuildLine():
            ThreePointArc((-86, -40.5), (-80.522774425, -38.330951895), (-78.015640289, -33))
            ThreePointArc((-78.015640289, -33), (-78.003911028, -32.750122279), (-78, -32.5))
            ThreePointArc((-78, -32.5), (-78.003911028, -32.249877721), (-78.015640289, -32))
            Line((-78.015640289, -32), (-93.984359711, -32))
            ThreePointArc((-93.984359711, -32), (-91.830951895, -37.977225575), (-86, -40.5))
        make_face()
        with BuildLine():
            ThreePointArc((-78.015640289, -32), (-86, -24.5), (-93.984359711, -32))
            Line((-93.984359711, -32), (-78.015640289, -32))
        make_face()
        with BuildLine():
            Line((-43.984359711, -33), (-78.015640289, -33))
            ThreePointArc((-78.015640289, -33), (-80.522774425, -38.330951895), (-86, -40.5))
            Line((-86, -40.5), (-36, -40.5))
            ThreePointArc((-36, -40.5), (-41.477225575, -38.330951895), (-43.984359711, -33))
        make_face()
        with BuildLine():
            ThreePointArc((-43.984359711, -32), (-44, -32.5), (-43.984359711, -33))
            ThreePointArc((-43.984359711, -33), (-41.477225575, -38.330951895), (-36, -40.5))
            ThreePointArc((-36, -40.5), (-30.343145751, -38.156854249), (-28, -32.5))
            ThreePointArc((-28, -32.5), (-28.003911028, -32.249877721), (-28.015640289, -32))
            Line((-28.015640289, -32), (-43.984359711, -32))
        make_face()
        with BuildLine():
            ThreePointArc((-28.015640289, -32), (-36, -24.5), (-43.984359711, -32))
            Line((-43.984359711, -32), (-28.015640289, -32))
        make_face()
    extrude(amount=-CUT_EXTRUDE4_DEPTH, mode=Mode.SUBTRACT)


with BuildPart() as body_2:
    # Sketch2 → Boss-Extrude2 (new body)
    # profile 1 of 2: a face of its own
    with BuildSketch(Plane.ZY.offset(112.5)):
        with BuildLine():
            Line((3, 0), (3, -32))
            Line((3, -32), (18, -32))
            Line((18, -32), (18, -27.5))
            ThreePointArc((18, -27.5), (18.878679656, -25.378679656), (21, -24.5))
            Line((21, -24.5), (30, -24.5))
            ThreePointArc((30, -24.5), (54.5, 0), (30, 24.5))
            Line((30, 24.5), (21, 24.5))
            ThreePointArc((21, 24.5), (18.878679656, 25.378679656), (18, 27.5))
            Line((18, 27.5), (18, 32))
            Line((18, 32), (3, 32))
            Line((3, 32), (3, 0))
        make_face()
        with Locations((10.5, -17.944358445)):
            Circle(SKETCH2_R, mode=Mode.SUBTRACT)
        with BuildLine():
            ThreePointArc((18.5, 0), (17, -1.5), (15.5, 0))
            ThreePointArc((15.5, 0), (17, 1.5), (18.5, 0))
        make_face(mode=Mode.SUBTRACT)
        with Locations((30, -13)):
            Circle(SKETCH2_R, mode=Mode.SUBTRACT)
        with Locations((44.495689014, -14.495689014)):
            Circle(SKETCH2_R, mode=Mode.SUBTRACT)
        with Locations((10.5, 17.944358445)):
            Circle(SKETCH2_R, mode=Mode.SUBTRACT)
        with BuildLine():
            ThreePointArc((40.75, 0), (30, -10.75), (19.25, 0))
            ThreePointArc((19.25, 0), (30, 10.75), (40.75, 0))
        make_face(mode=Mode.SUBTRACT)
        with Locations((30, 13)):
            Circle(SKETCH2_R, mode=Mode.SUBTRACT)
        with BuildLine():
            ThreePointArc((44.5, 0), (43, -1.5), (41.5, 0))
            ThreePointArc((41.5, 0), (43, 1.5), (44.5, 0))
        make_face(mode=Mode.SUBTRACT)
        with Locations((44.495689014, 14.495689014)):
            Circle(SKETCH2_R, mode=Mode.SUBTRACT)
    # profile 2 of 2: a face of its own
    with BuildSketch(Plane.ZY.offset(112.5)):
        with BuildLine():
            Line((3, 0), (3, -32))
            Line((3, -32), (18, -32))
            Line((18, -32), (18, -27.5))
            ThreePointArc((18, -27.5), (18.878679656, -25.378679656), (21, -24.5))
            Line((21, -24.5), (30, -24.5))
            ThreePointArc((30, -24.5), (54.5, 0), (30, 24.5))
            Line((30, 24.5), (21, 24.5))
            ThreePointArc((21, 24.5), (18.878679656, 25.378679656), (18, 27.5))
            Line((18, 27.5), (18, 32))
            Line((18, 32), (3, 32))
            Line((3, 32), (3, 0))
        make_face()
        with Locations((10.5, -17.944358445)):
            Circle(SKETCH2_R, mode=Mode.SUBTRACT)
        with BuildLine():
            ThreePointArc((18.5, 0), (17, -1.5), (15.5, 0))
            ThreePointArc((15.5, 0), (17, 1.5), (18.5, 0))
        make_face(mode=Mode.SUBTRACT)
        with Locations((30, -13)):
            Circle(SKETCH2_R, mode=Mode.SUBTRACT)
        with Locations((44.495689014, -14.495689014)):
            Circle(SKETCH2_R, mode=Mode.SUBTRACT)
        with Locations((10.5, 17.944358445)):
            Circle(SKETCH2_R, mode=Mode.SUBTRACT)
        with BuildLine():
            ThreePointArc((40.75, 0), (30, -10.75), (19.25, 0))
            ThreePointArc((19.25, 0), (30, 10.75), (40.75, 0))
        make_face(mode=Mode.SUBTRACT)
        with Locations((30, 13)):
            Circle(SKETCH2_R, mode=Mode.SUBTRACT)
        with BuildLine():
            ThreePointArc((44.5, 0), (43, -1.5), (41.5, 0))
            ThreePointArc((41.5, 0), (43, 1.5), (44.5, 0))
        make_face(mode=Mode.SUBTRACT)
        with Locations((44.495689014, 14.495689014)):
            Circle(SKETCH2_R, mode=Mode.SUBTRACT)
    extrude(amount=-BOSS_EXTRUDE2_DEPTH)


solid = Compound([part.part, body_2.part])
